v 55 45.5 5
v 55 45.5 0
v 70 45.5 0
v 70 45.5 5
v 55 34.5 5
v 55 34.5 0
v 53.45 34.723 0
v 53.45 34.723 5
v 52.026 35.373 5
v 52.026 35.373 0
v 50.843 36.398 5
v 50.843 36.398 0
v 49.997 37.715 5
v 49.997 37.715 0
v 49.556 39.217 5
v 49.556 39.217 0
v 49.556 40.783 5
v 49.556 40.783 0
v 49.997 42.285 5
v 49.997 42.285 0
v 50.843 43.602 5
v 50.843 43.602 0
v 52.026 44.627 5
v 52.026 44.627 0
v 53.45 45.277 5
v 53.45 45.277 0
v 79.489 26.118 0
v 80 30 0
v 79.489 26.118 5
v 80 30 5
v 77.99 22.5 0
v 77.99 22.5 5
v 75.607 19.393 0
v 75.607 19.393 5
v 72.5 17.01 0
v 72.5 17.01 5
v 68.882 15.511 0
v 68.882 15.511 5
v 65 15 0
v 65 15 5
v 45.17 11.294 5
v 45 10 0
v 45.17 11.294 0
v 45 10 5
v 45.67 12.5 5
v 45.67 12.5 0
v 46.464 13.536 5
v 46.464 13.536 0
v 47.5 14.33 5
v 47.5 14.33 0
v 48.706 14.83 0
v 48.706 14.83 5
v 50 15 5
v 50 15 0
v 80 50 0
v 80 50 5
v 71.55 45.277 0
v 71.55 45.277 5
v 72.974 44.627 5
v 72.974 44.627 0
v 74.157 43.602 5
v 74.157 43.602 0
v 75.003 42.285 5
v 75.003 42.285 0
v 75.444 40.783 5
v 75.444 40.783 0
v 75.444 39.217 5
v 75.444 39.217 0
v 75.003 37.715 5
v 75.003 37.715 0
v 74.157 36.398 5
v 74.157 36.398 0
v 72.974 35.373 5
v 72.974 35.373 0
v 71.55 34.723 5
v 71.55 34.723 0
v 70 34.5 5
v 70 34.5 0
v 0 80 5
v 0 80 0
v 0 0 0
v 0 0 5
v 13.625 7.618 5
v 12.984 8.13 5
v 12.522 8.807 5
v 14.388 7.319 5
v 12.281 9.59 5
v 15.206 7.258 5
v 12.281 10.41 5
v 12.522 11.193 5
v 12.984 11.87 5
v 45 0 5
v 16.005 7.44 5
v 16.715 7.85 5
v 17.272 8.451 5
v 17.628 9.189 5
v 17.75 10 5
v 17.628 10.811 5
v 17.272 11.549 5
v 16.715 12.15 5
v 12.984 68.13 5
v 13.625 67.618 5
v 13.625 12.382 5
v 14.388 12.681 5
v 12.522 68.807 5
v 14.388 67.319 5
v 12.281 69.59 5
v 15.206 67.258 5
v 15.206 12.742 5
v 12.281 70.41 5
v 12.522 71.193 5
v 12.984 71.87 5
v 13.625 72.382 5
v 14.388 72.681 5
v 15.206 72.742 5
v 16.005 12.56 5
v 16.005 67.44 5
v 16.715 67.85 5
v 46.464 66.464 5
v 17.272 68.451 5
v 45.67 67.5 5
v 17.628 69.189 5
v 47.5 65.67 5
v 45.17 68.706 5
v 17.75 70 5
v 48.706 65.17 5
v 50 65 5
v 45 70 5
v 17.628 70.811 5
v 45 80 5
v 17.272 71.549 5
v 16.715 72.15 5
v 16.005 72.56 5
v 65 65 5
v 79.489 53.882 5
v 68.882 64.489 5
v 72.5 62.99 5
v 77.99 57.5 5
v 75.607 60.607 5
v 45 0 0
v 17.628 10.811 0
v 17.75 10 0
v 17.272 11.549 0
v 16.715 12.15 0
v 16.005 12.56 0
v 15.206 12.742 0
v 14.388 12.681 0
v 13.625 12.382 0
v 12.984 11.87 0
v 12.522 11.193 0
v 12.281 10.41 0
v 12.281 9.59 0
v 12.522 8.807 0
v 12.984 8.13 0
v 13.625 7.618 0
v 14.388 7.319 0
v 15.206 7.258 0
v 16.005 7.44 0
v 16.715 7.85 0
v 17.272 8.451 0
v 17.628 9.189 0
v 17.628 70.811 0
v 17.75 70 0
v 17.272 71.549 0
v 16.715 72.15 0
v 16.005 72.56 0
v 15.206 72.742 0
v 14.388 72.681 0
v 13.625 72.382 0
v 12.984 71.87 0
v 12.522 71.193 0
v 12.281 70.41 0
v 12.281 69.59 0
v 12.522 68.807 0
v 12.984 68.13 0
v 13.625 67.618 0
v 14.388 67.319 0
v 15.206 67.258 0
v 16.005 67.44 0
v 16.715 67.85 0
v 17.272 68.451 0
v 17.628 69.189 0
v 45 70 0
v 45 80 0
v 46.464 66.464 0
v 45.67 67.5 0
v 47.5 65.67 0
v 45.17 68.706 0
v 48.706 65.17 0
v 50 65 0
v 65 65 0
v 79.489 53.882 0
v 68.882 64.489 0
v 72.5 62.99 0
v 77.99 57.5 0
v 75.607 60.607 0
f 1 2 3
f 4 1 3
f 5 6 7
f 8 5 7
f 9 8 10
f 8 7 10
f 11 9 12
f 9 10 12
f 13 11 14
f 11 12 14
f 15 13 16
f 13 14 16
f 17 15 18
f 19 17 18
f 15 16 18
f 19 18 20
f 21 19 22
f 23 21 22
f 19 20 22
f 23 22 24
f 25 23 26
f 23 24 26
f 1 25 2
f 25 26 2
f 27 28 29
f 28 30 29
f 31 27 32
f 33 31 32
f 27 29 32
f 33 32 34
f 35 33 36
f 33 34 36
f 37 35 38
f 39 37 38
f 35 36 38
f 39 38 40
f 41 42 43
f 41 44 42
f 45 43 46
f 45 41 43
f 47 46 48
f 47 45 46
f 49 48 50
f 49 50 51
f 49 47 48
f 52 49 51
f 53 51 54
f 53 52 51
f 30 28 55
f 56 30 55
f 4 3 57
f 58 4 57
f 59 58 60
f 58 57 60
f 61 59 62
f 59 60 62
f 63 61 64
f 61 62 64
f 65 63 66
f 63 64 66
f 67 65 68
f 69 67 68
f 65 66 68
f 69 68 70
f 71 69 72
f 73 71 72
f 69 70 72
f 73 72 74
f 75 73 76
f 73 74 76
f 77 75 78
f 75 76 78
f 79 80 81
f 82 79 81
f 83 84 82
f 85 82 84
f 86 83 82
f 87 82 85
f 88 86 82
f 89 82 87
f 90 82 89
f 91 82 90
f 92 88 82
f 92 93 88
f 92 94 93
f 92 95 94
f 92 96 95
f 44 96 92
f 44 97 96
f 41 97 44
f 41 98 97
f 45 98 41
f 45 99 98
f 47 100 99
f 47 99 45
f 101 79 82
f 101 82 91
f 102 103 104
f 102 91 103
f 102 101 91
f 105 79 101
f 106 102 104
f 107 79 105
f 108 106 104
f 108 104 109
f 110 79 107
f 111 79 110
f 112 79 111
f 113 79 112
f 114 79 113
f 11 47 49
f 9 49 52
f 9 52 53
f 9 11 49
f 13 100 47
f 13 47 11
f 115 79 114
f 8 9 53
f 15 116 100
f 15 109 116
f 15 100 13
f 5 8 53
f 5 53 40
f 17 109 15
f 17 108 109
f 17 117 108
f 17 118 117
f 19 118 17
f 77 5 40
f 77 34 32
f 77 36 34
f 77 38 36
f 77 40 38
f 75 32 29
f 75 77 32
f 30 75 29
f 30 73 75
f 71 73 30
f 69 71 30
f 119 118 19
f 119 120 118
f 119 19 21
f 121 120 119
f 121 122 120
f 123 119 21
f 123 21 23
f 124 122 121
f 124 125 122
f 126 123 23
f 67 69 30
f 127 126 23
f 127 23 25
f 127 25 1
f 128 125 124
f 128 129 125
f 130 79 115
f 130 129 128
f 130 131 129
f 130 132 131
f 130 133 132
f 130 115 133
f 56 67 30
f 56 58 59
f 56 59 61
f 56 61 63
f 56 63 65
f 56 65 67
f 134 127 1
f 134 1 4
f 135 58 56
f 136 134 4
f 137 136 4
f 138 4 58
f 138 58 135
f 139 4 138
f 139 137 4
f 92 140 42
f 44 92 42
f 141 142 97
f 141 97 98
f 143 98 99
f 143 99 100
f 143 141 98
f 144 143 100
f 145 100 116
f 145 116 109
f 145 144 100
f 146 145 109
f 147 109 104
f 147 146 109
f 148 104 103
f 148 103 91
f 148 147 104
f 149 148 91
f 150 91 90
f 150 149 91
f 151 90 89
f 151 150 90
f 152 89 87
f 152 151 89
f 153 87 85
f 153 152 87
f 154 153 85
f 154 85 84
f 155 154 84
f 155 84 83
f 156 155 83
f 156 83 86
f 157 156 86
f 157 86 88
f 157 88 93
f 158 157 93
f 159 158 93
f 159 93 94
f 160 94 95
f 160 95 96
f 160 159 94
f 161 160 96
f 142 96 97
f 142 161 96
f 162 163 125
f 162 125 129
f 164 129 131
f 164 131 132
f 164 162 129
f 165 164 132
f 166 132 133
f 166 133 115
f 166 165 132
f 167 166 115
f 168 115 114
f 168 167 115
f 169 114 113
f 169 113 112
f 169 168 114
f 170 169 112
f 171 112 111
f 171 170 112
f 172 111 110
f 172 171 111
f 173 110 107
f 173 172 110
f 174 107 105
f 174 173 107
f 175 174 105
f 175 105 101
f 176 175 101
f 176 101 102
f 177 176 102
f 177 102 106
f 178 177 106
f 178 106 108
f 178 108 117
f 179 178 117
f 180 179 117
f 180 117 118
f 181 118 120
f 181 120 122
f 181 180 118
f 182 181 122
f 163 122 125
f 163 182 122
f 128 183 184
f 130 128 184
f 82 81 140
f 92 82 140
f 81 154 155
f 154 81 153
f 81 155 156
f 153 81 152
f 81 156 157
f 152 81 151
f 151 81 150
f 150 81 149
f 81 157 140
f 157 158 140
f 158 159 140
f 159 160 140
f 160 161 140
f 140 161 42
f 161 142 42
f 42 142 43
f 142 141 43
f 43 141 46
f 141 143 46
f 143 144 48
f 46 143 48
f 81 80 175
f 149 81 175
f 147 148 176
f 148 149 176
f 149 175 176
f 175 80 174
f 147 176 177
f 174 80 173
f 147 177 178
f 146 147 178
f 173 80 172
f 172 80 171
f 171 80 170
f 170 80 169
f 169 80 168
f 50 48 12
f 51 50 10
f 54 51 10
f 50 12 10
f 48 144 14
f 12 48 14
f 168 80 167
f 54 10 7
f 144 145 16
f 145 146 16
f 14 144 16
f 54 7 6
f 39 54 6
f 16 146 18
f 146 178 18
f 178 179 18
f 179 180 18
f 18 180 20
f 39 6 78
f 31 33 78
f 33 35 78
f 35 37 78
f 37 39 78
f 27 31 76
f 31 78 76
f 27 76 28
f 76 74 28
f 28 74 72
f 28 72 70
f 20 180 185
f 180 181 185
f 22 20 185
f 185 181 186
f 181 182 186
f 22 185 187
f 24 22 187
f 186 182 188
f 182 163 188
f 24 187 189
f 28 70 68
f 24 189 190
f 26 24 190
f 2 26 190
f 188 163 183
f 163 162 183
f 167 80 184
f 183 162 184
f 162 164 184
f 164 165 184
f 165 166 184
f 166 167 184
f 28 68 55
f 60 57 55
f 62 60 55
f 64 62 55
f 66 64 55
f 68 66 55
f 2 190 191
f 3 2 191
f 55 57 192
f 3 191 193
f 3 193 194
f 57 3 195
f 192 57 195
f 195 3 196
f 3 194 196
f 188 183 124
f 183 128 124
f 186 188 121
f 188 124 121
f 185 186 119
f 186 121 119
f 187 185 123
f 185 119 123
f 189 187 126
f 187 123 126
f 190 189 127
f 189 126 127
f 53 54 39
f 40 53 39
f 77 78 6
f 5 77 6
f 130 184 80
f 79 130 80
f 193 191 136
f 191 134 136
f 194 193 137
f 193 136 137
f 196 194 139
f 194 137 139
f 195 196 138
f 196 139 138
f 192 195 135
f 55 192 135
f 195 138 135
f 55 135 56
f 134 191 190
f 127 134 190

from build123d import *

# Parameters (mm, degrees)
ESQUISSE1_R        = 2.75
BOSS_EXTRU_1_DEPTH = 5
CONG_1_R           = 5
CONG_2_R           = 15


with BuildPart() as part:
    # Esquisse1 → Boss.-Extru.1 (new body)
    with BuildSketch(Plane.XY):
        Polygon((0, 80), (0, 0), (45, 0), (45, 15), (80, 15), (80, 65), (45, 65), (45, 80), align=None)
        with Locations((15, 10)):
            Circle(ESQUISSE1_R, mode=Mode.SUBTRACT)
        with Locations((15, 70)):
            Circle(ESQUISSE1_R, mode=Mode.SUBTRACT)
        with BuildLine():
            ThreePointArc((70, 45.5), (75.5, 40), (70, 34.5))
            Line((70, 34.5), (55, 34.5))
            ThreePointArc((55, 34.5), (49.5, 40), (55, 45.5))
            Line((55, 45.5), (70, 45.5))
        make_face(mode=Mode.SUBTRACT)
    extrude(amount=BOSS_EXTRU_1_DEPTH)

    # Congé1
    cong_1_edges = [part.edges().sort_by_distance(p)[0] for p in [
        (45, 65, 2.5),
        (45, 15, 2.5),
    ]]
    fillet(cong_1_edges, radius=CONG_1_R)

    # Congé2
    cong_2_edges = [part.edges().sort_by_distance(p)[0] for p in [
        (80, 65, 2.5),
        (80, 15, 2.5),
    ]]
    fillet(cong_2_edges, radius=CONG_2_R)


solid = part.part
